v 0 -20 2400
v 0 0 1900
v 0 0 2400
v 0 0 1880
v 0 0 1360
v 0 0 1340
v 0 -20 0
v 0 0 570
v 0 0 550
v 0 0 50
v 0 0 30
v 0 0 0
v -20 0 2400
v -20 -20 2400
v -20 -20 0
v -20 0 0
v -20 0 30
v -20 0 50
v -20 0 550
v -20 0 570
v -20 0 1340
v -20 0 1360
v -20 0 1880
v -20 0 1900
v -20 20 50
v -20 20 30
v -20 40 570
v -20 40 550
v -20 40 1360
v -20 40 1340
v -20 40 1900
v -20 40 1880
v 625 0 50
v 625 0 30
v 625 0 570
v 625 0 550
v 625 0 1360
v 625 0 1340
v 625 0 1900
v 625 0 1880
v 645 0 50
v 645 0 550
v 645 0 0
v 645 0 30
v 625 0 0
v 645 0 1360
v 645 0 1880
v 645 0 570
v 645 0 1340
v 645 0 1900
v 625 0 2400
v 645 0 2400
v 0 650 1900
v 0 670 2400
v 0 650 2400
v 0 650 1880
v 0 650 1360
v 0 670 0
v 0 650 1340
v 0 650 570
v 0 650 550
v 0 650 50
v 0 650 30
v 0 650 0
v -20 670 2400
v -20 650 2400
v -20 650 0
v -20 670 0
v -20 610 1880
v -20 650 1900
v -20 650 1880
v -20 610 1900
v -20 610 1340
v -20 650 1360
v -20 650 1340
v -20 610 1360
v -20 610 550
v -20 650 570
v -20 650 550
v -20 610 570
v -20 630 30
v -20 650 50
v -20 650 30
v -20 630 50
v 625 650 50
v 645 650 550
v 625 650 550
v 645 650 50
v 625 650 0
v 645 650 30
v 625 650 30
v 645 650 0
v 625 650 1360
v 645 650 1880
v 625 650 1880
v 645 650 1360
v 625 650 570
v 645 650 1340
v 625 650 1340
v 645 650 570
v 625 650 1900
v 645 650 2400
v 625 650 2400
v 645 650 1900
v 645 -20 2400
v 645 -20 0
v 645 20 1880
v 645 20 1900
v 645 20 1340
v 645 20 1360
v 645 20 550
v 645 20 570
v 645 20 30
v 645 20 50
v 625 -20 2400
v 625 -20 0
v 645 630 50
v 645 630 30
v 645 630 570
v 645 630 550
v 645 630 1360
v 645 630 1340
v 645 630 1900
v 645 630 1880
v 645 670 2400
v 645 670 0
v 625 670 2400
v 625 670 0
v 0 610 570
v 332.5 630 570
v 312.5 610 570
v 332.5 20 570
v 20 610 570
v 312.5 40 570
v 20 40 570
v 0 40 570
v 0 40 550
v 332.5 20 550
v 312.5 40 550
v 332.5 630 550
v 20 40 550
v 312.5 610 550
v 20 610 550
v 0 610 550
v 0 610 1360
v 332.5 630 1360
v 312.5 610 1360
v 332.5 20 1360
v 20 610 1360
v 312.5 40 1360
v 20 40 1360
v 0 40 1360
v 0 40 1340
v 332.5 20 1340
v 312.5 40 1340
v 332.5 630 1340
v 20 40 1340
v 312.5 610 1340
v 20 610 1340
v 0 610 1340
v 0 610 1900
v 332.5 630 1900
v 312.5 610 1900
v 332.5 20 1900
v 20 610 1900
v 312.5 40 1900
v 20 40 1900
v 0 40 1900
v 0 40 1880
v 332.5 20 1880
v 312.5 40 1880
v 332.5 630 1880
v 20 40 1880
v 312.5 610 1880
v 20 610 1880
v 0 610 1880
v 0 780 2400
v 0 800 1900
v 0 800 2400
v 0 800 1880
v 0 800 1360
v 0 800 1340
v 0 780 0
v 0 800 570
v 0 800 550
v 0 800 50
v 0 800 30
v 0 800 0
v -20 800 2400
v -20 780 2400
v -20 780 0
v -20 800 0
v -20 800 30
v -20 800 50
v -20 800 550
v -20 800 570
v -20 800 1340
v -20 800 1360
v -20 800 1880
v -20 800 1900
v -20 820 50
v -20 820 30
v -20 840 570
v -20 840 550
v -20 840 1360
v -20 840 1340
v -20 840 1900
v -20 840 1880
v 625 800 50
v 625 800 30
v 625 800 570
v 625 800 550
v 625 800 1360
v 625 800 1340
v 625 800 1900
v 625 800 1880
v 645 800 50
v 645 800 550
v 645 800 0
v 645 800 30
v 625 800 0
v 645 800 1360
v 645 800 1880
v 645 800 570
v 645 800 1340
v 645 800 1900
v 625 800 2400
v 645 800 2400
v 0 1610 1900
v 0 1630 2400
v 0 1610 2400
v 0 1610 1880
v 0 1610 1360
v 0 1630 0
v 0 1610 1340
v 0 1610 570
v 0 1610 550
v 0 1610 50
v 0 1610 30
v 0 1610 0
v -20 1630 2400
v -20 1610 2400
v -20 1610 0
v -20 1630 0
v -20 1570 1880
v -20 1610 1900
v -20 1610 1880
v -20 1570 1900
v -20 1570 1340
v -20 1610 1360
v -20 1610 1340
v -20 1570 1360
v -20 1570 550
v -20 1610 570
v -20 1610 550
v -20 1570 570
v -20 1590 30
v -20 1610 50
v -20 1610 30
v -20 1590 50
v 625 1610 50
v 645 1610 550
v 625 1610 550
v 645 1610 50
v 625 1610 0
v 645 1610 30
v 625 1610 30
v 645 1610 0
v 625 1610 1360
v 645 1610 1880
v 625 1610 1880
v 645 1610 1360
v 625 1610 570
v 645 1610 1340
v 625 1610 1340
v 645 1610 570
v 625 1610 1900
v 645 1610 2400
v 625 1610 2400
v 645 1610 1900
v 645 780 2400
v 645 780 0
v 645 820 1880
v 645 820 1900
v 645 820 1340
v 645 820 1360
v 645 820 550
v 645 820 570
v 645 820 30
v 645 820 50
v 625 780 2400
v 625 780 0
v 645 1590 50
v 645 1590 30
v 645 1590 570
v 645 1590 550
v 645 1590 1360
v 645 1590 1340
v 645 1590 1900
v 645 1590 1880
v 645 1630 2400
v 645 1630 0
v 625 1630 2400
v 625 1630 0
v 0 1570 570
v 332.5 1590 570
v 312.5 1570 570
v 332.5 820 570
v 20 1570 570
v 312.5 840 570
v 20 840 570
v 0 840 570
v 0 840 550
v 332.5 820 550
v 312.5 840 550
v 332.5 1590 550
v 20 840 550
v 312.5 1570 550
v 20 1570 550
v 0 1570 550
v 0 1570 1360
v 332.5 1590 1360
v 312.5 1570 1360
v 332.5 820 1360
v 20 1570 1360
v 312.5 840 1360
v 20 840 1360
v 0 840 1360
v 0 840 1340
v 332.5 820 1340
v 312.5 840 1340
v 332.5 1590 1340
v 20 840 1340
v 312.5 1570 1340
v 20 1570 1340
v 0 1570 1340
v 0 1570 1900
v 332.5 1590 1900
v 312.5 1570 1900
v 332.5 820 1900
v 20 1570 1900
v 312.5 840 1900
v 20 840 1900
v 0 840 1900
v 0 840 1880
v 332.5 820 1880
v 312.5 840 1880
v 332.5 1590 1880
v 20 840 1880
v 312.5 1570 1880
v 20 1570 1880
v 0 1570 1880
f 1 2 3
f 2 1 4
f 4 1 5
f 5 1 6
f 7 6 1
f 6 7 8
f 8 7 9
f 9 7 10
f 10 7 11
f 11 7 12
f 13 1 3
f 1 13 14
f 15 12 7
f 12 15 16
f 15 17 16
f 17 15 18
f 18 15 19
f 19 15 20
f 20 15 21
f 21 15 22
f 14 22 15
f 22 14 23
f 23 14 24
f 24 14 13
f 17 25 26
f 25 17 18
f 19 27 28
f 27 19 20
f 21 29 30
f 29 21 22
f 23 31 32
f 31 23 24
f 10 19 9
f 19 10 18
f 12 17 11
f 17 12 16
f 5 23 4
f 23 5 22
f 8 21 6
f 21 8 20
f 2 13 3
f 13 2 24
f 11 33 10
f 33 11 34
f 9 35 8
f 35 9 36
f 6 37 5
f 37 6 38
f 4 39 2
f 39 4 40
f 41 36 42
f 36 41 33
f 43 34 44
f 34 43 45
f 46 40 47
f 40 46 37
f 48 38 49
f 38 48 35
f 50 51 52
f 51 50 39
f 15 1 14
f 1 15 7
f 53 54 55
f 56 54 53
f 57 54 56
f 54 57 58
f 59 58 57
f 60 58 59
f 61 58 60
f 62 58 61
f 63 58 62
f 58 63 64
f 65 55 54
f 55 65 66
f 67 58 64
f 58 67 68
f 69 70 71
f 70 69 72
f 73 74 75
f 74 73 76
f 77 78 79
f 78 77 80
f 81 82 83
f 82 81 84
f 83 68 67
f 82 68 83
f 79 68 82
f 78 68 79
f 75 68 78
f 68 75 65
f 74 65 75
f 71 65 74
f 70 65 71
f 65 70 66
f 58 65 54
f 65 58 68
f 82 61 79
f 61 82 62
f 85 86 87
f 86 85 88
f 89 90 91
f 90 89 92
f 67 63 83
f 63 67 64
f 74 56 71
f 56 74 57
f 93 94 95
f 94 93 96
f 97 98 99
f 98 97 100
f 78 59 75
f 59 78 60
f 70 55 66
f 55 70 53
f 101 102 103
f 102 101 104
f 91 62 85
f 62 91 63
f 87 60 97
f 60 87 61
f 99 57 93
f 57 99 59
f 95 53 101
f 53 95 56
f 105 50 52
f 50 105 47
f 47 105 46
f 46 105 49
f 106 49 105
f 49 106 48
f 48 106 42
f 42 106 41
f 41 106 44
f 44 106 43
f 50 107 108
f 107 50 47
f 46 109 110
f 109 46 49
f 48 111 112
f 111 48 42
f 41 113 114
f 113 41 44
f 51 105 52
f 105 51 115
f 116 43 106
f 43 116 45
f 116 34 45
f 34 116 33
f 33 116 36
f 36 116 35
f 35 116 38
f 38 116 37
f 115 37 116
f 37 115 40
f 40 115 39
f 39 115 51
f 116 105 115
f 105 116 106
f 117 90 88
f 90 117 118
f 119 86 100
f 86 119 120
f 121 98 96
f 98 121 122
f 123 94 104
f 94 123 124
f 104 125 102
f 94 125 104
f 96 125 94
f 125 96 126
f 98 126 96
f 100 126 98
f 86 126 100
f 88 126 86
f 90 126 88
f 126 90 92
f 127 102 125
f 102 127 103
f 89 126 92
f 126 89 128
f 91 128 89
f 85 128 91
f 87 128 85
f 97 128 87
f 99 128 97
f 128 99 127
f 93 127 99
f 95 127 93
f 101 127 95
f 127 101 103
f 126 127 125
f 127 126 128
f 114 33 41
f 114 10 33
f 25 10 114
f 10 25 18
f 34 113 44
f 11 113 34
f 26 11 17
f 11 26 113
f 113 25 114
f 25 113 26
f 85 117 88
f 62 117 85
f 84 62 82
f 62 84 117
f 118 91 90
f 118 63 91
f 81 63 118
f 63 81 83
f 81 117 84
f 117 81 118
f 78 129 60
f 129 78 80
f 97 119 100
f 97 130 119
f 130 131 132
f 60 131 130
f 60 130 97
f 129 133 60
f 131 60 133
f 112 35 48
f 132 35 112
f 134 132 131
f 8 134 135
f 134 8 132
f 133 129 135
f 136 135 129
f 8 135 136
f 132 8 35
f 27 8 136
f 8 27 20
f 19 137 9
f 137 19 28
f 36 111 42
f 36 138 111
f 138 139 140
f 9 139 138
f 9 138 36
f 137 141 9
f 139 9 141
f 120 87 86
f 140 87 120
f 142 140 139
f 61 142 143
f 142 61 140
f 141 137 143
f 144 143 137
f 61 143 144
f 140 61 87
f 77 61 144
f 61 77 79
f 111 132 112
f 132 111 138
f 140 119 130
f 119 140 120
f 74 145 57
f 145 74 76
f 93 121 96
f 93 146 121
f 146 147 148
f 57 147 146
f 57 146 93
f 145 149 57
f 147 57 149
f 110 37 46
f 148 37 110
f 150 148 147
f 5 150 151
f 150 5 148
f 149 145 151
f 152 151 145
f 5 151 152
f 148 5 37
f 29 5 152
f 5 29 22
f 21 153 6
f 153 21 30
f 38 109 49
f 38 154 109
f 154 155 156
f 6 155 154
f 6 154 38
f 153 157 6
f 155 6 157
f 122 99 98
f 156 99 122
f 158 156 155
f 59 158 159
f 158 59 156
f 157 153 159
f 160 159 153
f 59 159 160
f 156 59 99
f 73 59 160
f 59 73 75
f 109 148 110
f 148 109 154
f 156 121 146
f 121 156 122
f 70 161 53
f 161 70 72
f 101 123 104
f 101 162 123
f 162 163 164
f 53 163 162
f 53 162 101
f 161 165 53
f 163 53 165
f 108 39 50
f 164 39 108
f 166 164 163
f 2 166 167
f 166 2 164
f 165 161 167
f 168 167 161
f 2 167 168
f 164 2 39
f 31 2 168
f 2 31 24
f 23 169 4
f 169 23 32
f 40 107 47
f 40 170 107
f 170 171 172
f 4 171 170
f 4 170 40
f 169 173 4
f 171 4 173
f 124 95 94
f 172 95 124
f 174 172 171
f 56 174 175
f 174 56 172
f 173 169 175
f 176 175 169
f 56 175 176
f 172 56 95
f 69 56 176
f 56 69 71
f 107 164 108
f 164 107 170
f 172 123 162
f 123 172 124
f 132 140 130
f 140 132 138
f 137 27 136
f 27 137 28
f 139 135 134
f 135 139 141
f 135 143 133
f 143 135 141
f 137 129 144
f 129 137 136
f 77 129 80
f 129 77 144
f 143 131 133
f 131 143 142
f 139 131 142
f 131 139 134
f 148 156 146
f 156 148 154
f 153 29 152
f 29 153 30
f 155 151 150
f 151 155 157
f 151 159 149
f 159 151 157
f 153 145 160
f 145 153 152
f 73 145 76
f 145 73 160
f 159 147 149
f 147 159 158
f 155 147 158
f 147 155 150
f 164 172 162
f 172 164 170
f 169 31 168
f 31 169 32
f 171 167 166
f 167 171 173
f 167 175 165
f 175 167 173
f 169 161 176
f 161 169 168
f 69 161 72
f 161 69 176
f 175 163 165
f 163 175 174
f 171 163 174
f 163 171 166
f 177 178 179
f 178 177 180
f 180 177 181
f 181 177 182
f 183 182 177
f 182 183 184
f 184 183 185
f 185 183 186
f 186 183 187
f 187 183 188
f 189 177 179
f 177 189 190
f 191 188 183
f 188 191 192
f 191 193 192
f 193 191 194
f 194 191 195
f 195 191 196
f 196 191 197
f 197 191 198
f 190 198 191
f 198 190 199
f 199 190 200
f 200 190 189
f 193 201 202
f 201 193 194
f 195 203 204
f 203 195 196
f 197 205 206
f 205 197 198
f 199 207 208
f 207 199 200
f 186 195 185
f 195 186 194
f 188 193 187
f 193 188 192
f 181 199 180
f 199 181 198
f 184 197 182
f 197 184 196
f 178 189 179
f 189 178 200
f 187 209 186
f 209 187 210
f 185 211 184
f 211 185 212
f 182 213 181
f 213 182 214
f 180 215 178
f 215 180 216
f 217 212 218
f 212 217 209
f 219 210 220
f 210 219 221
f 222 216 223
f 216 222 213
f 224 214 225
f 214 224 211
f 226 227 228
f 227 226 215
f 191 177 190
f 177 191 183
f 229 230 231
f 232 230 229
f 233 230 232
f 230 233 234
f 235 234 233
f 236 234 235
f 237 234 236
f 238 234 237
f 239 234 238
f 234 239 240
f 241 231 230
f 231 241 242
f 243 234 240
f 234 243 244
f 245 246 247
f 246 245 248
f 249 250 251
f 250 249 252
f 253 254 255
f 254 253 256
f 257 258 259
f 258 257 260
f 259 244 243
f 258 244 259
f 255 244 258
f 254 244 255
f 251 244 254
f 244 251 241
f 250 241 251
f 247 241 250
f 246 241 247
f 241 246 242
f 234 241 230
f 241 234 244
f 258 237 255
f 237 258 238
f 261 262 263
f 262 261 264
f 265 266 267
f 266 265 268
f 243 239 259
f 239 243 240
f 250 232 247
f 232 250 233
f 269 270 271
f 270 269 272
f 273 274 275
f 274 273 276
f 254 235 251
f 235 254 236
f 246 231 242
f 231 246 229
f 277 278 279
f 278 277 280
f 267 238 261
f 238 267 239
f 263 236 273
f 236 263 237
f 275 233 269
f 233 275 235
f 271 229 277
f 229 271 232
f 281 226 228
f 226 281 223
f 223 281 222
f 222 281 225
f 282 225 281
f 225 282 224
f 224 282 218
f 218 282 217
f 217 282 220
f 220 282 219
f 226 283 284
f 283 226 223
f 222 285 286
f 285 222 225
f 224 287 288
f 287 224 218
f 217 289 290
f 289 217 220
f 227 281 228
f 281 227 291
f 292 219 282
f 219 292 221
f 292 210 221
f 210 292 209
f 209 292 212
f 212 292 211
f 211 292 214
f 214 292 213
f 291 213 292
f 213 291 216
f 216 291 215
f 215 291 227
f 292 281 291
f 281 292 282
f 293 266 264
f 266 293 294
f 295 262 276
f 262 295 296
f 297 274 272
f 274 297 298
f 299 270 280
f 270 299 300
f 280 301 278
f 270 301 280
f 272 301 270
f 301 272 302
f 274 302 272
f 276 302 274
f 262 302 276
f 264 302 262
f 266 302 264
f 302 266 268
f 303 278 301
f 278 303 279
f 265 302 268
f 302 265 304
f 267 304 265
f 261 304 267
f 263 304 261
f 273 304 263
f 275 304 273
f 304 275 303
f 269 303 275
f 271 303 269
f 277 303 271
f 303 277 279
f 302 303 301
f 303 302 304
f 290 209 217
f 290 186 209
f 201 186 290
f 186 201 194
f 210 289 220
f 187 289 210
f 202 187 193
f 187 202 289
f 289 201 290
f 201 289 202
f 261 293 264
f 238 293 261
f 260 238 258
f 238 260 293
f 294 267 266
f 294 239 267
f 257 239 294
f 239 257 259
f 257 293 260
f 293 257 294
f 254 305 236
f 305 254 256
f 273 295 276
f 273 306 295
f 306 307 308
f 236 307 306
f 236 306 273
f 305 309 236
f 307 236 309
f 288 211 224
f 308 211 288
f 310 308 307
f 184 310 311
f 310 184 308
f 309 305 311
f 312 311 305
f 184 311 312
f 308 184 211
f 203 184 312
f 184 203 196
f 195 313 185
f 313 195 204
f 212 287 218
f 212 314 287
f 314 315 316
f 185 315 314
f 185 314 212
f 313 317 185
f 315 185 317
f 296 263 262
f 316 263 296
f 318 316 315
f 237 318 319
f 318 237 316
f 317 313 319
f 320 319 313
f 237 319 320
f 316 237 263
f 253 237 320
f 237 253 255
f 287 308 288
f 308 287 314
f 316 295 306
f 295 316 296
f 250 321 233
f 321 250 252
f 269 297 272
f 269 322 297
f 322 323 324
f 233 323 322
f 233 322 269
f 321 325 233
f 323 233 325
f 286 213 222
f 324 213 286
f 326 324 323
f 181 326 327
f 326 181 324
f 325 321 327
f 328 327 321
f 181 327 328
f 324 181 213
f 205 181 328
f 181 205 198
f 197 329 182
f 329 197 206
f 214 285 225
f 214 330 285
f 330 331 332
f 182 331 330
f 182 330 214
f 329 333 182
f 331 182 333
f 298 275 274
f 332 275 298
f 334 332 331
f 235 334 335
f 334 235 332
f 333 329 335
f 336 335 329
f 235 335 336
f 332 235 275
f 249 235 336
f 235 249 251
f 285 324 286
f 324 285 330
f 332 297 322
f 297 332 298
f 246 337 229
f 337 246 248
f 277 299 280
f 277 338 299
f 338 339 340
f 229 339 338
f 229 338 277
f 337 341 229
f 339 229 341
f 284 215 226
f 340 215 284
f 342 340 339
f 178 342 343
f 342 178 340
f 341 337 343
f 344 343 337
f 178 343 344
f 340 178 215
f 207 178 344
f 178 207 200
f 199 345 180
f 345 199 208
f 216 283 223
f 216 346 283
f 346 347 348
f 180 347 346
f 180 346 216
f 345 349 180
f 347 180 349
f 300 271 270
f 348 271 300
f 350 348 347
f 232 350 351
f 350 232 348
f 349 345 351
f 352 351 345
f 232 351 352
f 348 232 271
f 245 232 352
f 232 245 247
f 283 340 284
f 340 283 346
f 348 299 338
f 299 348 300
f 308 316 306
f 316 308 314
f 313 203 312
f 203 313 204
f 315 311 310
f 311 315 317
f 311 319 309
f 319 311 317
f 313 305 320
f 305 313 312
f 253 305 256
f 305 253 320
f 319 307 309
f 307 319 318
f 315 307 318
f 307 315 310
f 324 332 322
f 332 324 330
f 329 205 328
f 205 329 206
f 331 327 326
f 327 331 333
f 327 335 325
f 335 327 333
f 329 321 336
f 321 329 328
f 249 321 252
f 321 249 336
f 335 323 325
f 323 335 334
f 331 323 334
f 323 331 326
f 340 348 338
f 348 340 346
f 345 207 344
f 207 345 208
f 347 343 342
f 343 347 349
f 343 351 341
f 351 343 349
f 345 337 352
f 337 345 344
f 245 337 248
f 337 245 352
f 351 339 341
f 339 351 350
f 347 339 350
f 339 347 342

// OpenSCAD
a=20;
//W=650;
D=625;  //OSB width

wall=16;    // лдсп
rail=13;    // направляюще

BPH=800;
bottom=450;

z=[30,290, 550,1340,1880];

r_tower();
translate([0,800,0]) l_tower();

module r_tower(){
    color([0,0,0])tower(W=650);
    // rails
//    %for(i=[2,3]) translate( [0,0,z[i] +a]) rails(W=650);
    %translate([-a,rail,z[0]+a+3]) spool_box(W=650);
    %translate([-a,rail,z[1]+a+3]) box_2_box(W=650);
}

module l_tower(){
    ltw=810;
    color([0,0,0])tower(W=ltw);
    // rails
  //  %for(i=[2,3]) translate( [0,0,z[i] +a]) rails(W=ltw);
    %translate([-a,rail,z[0]+a+3]) spool_box(W=ltw);
    %translate([-a,rail,z[1]+a+3]) box_4_box(W=ltw);
}

// --------------------------------------------------------------------------------------------+
module tower(W=654){
    for(x=[-a,D]) for(y=[-a,W]) translate([x,y,0]) cube([a,a,2400]);
        
    // frame
    for(i=[0,2,3,4]) translate([0,0,z[i]]) 
        for(y=[0,W-a]) translate([-a,y,0]) cube([D+2*a,a,a]);    
            
    for(i=[2:4]) translate([0,0,z[i]])   {
        for(x=[0,D/2]) for(y=[a,W-a*2]) for(z=[bottom,bottom+BPH,bottom+BPH*2, 2400-a]) {
            translate([-a,y,0]) cube([D/2+2*a,a,a]);
            translate([x,a,0]) cube([a, W-a*2,a]); 
        }
    }
    
}
    

    
module rails(W=650){
    for(y=[0,W-rail]) {
        translate([25/2,y,0]) cube([600,rail,46]);
        hull() {
            translate([0,a,23-a/2]) cube([D,a,a]);
            translate([0,W,23-a/2]) cube([D,a,a]);
        }
    }
}



module spool_box(W=650){
    l=670;//D+a*2;
    w=W-rail*2;
    spool=(l-wall*4)/3;//200;
    
    h=200;//spool+30;
    cube([l,w,wall]);
#    for(i=[0,1]) translate([0,i*(w-wall),wall]) cube([l,wall,h]);
 #   for(i=[0:3]) translate([i*(spool+wall), wall,wall]) cube([wall,w-wall*2,100]);
        
    face_h=520/2-4;
    translate([l,-20-rail+2,0]) color([0.9,1,1,0.5]) cube([wall,W+a*2-4, face_h]);
    
    translate([l,w/2,face_h/2]) color([0,0,0]) grip();
}

module box_2_box(W=650){
    l=670;//D+a*2;
    w=W-rail*2;
    bw=290;
    bl=395;
    bh=200;
    
    h=bh;
    cube([l,w,wall]);
    for(i=[0,1]) translate([0,i*(w-wall),wall]) cube([l-wall,wall,h]);
        
    translate([wall,(w-wall)/2,wall+h-100]) cube([bl-wall,wall,100]);
    
 #   translate([0, wall,wall+h-100]) cube([wall,w-wall*2,100]);
  #  translate([bl, wall,wall]) cube([wall,w-wall*2,h]);

 #   translate([l-wall, 0,wall]) cube([wall,w,h]);
    
    face_h=520/2-4;
    translate([l,-20-rail+2,0]) color([0.9,1,1,0.5]) cube([wall,W+a*2-4, face_h]);    
    
    translate([l,w/2,face_h/2]) color([0,0,0]) grip();
}

module box_4_box(W=810){
    l=670;//D+a*2;
    w=W-rail*2;
    bl=290;
    bw=395;
    bh=200;
    
    h=200;//bh;
    cube([l,w,wall]);
    for(i=[0,1]) translate([0,i*(w-wall),wall]) cube([l-wall,wall,h]);
        
 #  for(i=[0,1])translate([wall+i*(bl),(w-wall)/2,wall+h-100]) cube([bl-wall,wall,100]);
    
 #  for(i=[0,1,2])  translate([i*(bl), wall,wall+h-100]) cube([wall,w-wall*2,100]);
#   translate([l-wall, 0,wall]) cube([wall,w,h]);
    
    face_h=520/2-4;
    translate([l,-20-rail+2,0]) color([0.9,1,1,0.5]) cube([wall,W+a*2-4, face_h]);    
   
   translate([l,w/2,face_h/2]) color([0,0,0]) grip();
}

module grip(){
    for(i=[-1,1]) translate([32-15,i*(128/2-10),0]) rotate_extrude(angle=90*i) translate([10,0,0]) circle(r=5);
    translate([32-5,0,0]) rotate([90,0,0])cylinder(h=108,r=5,center=true);
    for(i=[-1,1]) translate([0,i*(128/2),0]) rotate([0,90,0]) cylinder(h=32-15,r=5);
}
